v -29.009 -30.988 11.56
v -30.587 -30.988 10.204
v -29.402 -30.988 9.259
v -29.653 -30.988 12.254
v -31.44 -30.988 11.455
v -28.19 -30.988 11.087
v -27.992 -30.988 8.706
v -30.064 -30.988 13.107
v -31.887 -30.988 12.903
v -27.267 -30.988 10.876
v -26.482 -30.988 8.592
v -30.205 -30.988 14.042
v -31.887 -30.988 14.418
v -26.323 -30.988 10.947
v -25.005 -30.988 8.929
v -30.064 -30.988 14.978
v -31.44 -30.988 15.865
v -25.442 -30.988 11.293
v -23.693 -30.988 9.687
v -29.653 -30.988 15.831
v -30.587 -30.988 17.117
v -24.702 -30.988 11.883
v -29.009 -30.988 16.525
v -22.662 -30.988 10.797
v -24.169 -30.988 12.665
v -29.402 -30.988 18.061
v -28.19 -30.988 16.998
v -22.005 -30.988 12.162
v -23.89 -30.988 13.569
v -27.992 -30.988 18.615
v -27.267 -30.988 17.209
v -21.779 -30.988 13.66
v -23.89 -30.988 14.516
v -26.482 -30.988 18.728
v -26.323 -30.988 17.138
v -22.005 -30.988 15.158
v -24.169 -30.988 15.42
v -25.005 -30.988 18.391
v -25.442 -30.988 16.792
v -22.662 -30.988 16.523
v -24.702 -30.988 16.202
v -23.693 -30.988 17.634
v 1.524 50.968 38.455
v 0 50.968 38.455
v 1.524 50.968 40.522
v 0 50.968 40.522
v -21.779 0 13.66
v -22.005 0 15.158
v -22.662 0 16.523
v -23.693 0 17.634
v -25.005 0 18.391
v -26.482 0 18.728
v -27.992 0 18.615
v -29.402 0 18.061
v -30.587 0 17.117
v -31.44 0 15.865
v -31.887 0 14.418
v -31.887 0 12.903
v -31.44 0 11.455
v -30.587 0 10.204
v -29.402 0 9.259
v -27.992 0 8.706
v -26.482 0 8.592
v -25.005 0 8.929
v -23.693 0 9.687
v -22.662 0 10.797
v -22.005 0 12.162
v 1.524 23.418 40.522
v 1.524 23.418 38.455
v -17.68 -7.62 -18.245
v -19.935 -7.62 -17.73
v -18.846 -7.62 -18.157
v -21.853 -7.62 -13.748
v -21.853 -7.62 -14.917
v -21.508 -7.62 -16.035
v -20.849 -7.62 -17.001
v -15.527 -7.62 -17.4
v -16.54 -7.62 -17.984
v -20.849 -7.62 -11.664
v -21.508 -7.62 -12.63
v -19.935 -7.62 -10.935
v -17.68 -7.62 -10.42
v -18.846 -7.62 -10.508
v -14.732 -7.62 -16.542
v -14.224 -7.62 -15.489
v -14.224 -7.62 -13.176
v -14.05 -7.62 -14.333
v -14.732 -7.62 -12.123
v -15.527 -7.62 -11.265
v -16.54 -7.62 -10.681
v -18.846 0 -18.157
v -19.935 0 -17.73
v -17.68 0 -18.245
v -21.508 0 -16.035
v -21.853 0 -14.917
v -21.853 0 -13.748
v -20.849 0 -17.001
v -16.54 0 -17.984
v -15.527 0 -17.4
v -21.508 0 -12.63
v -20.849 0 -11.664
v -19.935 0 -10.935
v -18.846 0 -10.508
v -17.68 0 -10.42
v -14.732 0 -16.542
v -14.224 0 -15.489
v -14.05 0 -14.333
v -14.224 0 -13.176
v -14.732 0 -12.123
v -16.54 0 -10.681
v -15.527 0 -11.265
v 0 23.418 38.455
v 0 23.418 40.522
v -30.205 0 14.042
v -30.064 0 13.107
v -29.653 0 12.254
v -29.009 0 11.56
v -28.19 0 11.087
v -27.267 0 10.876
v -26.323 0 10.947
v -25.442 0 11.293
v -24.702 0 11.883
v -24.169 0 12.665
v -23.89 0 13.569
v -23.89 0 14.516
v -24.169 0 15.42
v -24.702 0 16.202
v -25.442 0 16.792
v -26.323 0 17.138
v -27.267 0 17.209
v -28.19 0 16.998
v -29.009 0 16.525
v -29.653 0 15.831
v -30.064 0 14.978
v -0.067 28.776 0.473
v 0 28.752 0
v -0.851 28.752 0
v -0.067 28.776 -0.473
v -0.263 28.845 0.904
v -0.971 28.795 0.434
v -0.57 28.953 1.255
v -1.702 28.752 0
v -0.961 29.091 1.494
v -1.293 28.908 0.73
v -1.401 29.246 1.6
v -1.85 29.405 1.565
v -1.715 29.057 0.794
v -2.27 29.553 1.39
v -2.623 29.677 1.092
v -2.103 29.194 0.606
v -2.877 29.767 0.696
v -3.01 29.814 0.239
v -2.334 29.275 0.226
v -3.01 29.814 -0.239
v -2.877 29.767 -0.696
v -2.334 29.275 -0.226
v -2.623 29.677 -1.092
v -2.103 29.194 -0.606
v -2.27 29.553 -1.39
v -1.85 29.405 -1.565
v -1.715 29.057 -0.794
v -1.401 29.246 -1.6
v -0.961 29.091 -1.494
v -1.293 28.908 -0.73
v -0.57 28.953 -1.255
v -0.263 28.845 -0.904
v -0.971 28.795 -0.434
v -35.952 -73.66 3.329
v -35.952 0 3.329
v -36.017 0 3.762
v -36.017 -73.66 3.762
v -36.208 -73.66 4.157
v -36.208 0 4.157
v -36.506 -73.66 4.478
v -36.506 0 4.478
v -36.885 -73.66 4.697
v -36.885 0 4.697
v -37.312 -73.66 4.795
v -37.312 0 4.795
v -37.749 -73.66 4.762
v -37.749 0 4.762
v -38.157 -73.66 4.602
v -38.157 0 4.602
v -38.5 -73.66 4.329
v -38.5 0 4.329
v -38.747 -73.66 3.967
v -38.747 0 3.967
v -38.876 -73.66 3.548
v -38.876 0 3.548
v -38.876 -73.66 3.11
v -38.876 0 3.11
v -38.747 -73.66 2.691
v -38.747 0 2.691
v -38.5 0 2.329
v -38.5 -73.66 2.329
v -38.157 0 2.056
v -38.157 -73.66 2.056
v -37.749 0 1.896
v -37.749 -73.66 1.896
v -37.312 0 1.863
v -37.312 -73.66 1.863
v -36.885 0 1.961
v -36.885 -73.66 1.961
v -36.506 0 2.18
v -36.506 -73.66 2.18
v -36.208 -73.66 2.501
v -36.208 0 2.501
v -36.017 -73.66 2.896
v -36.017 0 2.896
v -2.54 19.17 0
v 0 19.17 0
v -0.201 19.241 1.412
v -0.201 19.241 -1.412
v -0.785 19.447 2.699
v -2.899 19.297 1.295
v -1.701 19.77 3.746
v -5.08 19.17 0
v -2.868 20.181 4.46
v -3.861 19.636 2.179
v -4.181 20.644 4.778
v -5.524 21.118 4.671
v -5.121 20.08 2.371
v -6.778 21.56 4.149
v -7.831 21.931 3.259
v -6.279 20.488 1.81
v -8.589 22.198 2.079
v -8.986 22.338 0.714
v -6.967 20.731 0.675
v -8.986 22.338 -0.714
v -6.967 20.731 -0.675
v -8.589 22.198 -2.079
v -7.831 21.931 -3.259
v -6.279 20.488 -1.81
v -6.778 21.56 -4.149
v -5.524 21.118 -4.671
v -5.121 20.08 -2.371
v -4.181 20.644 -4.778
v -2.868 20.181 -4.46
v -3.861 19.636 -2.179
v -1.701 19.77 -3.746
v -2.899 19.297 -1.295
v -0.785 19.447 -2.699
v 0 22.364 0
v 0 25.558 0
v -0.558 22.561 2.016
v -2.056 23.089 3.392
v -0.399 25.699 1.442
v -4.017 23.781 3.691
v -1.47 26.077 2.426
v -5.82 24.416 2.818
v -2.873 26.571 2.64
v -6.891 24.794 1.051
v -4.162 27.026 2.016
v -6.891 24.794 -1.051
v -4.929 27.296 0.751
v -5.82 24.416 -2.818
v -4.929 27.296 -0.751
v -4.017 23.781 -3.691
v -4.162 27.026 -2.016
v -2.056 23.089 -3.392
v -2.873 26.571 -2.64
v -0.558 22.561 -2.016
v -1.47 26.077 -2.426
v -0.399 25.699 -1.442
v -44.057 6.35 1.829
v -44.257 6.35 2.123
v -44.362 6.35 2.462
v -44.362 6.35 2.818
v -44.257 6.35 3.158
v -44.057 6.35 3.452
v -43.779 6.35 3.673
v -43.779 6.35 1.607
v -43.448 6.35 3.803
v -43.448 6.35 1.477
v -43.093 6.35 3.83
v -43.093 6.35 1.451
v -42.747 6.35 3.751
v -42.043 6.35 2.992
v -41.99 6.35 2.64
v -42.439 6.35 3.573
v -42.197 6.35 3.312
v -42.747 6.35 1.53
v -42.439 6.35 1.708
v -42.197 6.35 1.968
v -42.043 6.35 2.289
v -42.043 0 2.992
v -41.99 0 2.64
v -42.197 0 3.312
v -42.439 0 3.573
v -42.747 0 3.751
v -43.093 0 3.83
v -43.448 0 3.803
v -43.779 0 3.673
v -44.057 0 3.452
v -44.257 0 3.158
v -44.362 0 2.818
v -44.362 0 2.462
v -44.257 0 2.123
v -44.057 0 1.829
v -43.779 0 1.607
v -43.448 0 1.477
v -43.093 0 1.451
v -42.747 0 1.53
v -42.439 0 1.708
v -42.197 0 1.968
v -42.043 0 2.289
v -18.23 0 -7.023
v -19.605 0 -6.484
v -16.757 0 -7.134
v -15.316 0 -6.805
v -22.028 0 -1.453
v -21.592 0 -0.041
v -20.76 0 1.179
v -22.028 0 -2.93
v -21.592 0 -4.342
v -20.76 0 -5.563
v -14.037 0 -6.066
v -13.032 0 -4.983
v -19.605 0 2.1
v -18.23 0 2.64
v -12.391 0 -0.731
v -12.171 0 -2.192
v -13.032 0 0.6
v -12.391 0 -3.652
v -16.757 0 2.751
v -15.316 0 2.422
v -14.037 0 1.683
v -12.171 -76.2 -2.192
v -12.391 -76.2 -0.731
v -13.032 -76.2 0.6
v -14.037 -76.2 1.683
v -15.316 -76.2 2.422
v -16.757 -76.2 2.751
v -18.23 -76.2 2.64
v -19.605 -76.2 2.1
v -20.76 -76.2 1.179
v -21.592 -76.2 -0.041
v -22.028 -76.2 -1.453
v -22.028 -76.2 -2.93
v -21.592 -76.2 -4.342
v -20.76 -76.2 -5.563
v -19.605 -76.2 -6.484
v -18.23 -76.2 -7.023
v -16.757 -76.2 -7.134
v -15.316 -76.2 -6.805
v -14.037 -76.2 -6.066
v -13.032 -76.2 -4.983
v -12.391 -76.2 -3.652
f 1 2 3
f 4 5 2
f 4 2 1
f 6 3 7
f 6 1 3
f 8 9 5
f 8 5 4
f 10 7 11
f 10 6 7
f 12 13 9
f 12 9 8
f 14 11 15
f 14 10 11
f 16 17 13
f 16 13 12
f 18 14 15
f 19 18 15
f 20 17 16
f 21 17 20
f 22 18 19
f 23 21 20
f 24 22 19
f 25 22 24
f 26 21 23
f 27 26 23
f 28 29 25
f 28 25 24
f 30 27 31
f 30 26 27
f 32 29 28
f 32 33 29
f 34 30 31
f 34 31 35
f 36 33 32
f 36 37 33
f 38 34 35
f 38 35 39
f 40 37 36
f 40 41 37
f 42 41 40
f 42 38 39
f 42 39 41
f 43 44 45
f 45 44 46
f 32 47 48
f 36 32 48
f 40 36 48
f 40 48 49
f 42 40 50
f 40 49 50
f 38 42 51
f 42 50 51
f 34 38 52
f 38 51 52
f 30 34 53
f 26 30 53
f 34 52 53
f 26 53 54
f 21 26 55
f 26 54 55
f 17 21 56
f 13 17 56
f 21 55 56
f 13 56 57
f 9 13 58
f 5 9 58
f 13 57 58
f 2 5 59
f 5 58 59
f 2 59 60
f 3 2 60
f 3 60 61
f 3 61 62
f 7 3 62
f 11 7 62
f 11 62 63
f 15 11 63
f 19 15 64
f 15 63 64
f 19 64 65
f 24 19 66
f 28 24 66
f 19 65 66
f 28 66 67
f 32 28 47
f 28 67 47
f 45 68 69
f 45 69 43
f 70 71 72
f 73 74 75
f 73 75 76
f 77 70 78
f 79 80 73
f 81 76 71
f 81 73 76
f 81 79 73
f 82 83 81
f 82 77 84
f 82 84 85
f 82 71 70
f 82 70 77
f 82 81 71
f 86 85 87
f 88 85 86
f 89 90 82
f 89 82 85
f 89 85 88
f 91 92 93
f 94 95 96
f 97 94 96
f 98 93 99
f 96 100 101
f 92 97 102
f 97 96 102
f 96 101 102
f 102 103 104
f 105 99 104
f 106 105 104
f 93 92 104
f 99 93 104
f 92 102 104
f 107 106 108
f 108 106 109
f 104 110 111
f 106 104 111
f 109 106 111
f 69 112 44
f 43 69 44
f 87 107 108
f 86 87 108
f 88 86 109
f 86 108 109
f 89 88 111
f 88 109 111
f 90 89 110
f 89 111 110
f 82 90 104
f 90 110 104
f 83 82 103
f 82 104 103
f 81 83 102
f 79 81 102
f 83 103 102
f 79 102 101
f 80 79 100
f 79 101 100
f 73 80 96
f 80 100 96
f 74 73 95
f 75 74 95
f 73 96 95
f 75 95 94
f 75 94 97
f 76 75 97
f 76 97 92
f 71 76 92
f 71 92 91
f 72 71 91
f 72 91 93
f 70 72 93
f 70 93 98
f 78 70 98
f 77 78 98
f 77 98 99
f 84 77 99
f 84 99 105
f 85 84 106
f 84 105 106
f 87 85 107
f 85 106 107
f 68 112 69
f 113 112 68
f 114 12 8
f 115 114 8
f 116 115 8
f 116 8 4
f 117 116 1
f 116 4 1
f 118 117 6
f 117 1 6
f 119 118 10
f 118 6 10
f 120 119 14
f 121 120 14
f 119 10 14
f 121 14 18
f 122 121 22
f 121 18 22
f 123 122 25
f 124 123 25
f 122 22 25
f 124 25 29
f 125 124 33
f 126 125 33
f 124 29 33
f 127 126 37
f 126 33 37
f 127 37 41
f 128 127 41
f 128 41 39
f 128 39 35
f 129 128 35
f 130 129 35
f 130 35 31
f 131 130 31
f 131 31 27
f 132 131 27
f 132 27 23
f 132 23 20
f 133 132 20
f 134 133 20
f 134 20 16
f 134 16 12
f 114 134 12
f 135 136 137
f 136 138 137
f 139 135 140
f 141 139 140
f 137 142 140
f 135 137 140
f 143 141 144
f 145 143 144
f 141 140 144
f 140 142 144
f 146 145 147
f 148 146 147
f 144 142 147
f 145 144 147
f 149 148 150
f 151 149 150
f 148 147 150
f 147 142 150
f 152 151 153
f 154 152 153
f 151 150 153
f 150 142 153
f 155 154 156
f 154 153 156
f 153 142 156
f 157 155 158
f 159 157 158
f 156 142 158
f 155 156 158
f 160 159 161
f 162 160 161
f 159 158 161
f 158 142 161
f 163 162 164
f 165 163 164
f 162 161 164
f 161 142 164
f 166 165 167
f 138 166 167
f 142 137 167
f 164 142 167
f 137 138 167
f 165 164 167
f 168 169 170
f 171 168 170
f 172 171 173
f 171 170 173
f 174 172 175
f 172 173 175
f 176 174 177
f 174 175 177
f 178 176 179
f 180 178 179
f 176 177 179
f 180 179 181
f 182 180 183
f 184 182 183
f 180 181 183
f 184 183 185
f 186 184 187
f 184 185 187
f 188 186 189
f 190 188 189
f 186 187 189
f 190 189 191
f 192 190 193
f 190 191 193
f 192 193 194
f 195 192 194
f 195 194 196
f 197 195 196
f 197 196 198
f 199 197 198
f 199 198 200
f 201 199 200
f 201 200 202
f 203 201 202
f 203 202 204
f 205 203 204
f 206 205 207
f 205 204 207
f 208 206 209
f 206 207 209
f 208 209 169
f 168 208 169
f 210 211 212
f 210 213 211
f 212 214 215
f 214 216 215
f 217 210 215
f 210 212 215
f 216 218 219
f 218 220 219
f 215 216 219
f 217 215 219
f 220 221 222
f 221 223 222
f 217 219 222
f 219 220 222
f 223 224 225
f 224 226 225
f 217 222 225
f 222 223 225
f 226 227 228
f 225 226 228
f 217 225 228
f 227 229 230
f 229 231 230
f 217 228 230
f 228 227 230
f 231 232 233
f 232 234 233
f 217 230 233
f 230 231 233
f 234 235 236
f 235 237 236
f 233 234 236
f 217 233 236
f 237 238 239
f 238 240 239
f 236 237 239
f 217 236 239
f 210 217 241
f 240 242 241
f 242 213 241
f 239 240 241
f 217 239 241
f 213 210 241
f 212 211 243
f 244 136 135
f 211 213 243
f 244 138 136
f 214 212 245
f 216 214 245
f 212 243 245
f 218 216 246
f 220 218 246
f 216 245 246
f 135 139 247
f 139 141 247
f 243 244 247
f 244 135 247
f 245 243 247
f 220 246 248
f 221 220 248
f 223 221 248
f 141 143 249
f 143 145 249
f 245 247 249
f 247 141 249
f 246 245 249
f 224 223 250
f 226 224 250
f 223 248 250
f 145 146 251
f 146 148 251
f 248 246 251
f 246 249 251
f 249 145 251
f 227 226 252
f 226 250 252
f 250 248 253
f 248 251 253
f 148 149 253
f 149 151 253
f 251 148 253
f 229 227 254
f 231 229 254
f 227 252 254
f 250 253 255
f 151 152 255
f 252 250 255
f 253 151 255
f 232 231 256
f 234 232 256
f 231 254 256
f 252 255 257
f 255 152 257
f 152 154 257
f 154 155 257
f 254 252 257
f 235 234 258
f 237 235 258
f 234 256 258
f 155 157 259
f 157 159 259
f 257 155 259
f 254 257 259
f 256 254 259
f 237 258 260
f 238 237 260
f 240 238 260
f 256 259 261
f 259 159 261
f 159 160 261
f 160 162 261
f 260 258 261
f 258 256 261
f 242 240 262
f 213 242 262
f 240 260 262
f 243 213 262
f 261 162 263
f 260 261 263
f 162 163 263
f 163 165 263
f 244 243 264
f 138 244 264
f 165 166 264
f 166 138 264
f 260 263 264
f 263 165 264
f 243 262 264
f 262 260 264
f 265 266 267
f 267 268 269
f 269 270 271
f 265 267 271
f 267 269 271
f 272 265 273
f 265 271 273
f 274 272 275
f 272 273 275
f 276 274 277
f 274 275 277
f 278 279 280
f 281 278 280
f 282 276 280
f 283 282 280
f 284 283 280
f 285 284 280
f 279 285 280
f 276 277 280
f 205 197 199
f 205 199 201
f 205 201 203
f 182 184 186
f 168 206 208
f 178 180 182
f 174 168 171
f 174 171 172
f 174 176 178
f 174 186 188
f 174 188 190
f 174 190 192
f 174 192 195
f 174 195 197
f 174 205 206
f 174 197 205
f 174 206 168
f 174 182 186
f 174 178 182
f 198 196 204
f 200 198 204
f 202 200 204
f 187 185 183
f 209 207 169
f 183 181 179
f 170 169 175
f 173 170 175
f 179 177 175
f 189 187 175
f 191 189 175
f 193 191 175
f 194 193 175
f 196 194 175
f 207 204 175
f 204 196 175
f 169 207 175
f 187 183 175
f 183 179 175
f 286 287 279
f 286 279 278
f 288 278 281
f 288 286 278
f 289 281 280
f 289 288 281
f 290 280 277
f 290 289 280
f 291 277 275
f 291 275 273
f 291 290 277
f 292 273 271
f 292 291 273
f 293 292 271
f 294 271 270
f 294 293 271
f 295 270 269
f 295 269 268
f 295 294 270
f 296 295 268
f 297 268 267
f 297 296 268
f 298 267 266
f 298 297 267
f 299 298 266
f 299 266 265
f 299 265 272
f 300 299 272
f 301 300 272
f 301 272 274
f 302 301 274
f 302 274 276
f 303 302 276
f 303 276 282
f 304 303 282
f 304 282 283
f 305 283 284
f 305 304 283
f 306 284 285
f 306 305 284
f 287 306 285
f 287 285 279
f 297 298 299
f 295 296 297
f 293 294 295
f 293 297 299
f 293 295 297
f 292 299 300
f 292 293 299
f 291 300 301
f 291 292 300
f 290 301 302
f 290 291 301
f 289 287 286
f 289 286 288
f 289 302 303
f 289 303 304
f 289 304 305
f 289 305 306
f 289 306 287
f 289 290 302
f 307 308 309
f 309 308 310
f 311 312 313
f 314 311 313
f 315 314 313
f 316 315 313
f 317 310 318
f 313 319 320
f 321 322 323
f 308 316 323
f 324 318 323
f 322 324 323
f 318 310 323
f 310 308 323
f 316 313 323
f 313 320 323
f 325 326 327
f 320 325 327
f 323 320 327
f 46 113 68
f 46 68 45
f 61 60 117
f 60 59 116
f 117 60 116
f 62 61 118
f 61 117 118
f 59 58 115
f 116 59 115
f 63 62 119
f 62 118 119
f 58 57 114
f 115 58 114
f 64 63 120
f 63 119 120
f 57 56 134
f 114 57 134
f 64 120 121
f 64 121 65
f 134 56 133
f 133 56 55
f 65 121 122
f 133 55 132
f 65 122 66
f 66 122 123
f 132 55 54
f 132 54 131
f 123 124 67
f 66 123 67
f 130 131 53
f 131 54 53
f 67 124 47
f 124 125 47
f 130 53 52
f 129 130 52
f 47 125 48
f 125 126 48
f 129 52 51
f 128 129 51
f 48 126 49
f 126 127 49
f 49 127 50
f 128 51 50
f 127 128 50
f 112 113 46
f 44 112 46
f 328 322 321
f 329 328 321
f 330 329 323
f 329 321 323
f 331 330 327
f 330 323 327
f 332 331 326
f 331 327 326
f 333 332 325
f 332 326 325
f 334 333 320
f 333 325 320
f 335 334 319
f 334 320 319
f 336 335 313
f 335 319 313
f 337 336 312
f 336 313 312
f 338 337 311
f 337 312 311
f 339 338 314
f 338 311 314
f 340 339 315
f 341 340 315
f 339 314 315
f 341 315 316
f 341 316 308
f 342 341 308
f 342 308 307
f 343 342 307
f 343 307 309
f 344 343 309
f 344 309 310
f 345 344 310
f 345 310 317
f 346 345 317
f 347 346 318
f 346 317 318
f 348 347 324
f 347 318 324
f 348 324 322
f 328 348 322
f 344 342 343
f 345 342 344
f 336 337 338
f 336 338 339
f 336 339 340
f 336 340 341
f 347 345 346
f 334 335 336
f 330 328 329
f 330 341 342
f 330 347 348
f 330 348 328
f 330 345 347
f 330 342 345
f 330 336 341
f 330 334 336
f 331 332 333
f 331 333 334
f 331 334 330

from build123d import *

# Parameters (mm, degrees)
F2_R      = 4.9560366271
F3_DEPTH  = 76.2
F4_R      = 3.9231322821
F5_DEPTH  = 7.62
F6_R      = 1.1929608885
F7_DEPTH  = 6.35
F8_W      = 27.5500733405
F8_H      = 2.0662583411
F9_DEPTH  = 1.524
F10_R     = 5.082057301
F11_DEPTH = 30.988
F13_D     = 6.35
F16_R     = 1.4700534699
F17_DEPTH = 73.66


# Not quite as in the source:
# - the program builds the solid bodies; features that only make, move or delete a surface that nothing else refers to are left out


with BuildPart() as f1:
    # F0 (on Top) → F1 (revolve)
    with BuildSketch(Plane.XY):
        Polygon((0, 19.1702581942), (0, 28.7521872672), (-1.7018, 28.7521872672), (-5.08, 19.1702581942), align=None)
    revolve(axis=Axis((-3.3909, 23.9612227307, 0), (-0.3325, -0.9431032552, 0)))


with BuildPart() as f3:
    # F2 (on Front) → F3 (new body)
    with BuildSketch(Plane.XZ):
        with Locations((-17.1269066632, -2.1915955003)):
            Circle(F2_R)
    extrude(amount=F3_DEPTH)


with BuildPart() as f5:
    # F4 (on Front) → F5 (new body)
    with BuildSketch(Plane.XZ):
        with Locations((-17.9732199758, -14.3325095996)):
            Circle(F4_R)
    extrude(amount=F5_DEPTH)


with BuildPart() as f7:
    # F6 (on Front) → F7 (new body)
    with BuildSketch(Plane.XZ):
        with Locations((-43.1825295091, 2.6402152143)):
            Circle(F6_R)
    extrude(amount=-F7_DEPTH)


with BuildPart() as f9:
    # F8 (on Right) → F9 (new body)
    with BuildSketch(Plane.YZ):
        with Locations((37.1925970539, 39.4884366542)):
            Rectangle(F8_W, F8_H)
    extrude(amount=F9_DEPTH)


with BuildPart() as f11:
    # F10 (on Front) → F11 (new body)
    with BuildSketch(Plane.XZ):
        with Locations((-26.8613211811, 13.6602437124)):
            Circle(F10_R)
    extrude(amount=F11_DEPTH)

    # F13 (through all)
    with Locations(Plane(origin=(0, 0, 0), x_dir=(1, 0, 0), z_dir=(0, 1, 0))):
        with Locations((-27.0296689123, -14.0424408019)):
            Hole(F13_D / 2)


with BuildPart() as f17:
    # F16 (on Front) → F17 (new body)
    with BuildSketch(Plane.XZ):
        with Locations((-37.4221801758, 3.328967141)):
            Circle(F16_R)
    extrude(amount=F17_DEPTH)


solid = Compound([f1.part, f3.part, f5.part, f7.part, f9.part, f11.part, f17.part])
